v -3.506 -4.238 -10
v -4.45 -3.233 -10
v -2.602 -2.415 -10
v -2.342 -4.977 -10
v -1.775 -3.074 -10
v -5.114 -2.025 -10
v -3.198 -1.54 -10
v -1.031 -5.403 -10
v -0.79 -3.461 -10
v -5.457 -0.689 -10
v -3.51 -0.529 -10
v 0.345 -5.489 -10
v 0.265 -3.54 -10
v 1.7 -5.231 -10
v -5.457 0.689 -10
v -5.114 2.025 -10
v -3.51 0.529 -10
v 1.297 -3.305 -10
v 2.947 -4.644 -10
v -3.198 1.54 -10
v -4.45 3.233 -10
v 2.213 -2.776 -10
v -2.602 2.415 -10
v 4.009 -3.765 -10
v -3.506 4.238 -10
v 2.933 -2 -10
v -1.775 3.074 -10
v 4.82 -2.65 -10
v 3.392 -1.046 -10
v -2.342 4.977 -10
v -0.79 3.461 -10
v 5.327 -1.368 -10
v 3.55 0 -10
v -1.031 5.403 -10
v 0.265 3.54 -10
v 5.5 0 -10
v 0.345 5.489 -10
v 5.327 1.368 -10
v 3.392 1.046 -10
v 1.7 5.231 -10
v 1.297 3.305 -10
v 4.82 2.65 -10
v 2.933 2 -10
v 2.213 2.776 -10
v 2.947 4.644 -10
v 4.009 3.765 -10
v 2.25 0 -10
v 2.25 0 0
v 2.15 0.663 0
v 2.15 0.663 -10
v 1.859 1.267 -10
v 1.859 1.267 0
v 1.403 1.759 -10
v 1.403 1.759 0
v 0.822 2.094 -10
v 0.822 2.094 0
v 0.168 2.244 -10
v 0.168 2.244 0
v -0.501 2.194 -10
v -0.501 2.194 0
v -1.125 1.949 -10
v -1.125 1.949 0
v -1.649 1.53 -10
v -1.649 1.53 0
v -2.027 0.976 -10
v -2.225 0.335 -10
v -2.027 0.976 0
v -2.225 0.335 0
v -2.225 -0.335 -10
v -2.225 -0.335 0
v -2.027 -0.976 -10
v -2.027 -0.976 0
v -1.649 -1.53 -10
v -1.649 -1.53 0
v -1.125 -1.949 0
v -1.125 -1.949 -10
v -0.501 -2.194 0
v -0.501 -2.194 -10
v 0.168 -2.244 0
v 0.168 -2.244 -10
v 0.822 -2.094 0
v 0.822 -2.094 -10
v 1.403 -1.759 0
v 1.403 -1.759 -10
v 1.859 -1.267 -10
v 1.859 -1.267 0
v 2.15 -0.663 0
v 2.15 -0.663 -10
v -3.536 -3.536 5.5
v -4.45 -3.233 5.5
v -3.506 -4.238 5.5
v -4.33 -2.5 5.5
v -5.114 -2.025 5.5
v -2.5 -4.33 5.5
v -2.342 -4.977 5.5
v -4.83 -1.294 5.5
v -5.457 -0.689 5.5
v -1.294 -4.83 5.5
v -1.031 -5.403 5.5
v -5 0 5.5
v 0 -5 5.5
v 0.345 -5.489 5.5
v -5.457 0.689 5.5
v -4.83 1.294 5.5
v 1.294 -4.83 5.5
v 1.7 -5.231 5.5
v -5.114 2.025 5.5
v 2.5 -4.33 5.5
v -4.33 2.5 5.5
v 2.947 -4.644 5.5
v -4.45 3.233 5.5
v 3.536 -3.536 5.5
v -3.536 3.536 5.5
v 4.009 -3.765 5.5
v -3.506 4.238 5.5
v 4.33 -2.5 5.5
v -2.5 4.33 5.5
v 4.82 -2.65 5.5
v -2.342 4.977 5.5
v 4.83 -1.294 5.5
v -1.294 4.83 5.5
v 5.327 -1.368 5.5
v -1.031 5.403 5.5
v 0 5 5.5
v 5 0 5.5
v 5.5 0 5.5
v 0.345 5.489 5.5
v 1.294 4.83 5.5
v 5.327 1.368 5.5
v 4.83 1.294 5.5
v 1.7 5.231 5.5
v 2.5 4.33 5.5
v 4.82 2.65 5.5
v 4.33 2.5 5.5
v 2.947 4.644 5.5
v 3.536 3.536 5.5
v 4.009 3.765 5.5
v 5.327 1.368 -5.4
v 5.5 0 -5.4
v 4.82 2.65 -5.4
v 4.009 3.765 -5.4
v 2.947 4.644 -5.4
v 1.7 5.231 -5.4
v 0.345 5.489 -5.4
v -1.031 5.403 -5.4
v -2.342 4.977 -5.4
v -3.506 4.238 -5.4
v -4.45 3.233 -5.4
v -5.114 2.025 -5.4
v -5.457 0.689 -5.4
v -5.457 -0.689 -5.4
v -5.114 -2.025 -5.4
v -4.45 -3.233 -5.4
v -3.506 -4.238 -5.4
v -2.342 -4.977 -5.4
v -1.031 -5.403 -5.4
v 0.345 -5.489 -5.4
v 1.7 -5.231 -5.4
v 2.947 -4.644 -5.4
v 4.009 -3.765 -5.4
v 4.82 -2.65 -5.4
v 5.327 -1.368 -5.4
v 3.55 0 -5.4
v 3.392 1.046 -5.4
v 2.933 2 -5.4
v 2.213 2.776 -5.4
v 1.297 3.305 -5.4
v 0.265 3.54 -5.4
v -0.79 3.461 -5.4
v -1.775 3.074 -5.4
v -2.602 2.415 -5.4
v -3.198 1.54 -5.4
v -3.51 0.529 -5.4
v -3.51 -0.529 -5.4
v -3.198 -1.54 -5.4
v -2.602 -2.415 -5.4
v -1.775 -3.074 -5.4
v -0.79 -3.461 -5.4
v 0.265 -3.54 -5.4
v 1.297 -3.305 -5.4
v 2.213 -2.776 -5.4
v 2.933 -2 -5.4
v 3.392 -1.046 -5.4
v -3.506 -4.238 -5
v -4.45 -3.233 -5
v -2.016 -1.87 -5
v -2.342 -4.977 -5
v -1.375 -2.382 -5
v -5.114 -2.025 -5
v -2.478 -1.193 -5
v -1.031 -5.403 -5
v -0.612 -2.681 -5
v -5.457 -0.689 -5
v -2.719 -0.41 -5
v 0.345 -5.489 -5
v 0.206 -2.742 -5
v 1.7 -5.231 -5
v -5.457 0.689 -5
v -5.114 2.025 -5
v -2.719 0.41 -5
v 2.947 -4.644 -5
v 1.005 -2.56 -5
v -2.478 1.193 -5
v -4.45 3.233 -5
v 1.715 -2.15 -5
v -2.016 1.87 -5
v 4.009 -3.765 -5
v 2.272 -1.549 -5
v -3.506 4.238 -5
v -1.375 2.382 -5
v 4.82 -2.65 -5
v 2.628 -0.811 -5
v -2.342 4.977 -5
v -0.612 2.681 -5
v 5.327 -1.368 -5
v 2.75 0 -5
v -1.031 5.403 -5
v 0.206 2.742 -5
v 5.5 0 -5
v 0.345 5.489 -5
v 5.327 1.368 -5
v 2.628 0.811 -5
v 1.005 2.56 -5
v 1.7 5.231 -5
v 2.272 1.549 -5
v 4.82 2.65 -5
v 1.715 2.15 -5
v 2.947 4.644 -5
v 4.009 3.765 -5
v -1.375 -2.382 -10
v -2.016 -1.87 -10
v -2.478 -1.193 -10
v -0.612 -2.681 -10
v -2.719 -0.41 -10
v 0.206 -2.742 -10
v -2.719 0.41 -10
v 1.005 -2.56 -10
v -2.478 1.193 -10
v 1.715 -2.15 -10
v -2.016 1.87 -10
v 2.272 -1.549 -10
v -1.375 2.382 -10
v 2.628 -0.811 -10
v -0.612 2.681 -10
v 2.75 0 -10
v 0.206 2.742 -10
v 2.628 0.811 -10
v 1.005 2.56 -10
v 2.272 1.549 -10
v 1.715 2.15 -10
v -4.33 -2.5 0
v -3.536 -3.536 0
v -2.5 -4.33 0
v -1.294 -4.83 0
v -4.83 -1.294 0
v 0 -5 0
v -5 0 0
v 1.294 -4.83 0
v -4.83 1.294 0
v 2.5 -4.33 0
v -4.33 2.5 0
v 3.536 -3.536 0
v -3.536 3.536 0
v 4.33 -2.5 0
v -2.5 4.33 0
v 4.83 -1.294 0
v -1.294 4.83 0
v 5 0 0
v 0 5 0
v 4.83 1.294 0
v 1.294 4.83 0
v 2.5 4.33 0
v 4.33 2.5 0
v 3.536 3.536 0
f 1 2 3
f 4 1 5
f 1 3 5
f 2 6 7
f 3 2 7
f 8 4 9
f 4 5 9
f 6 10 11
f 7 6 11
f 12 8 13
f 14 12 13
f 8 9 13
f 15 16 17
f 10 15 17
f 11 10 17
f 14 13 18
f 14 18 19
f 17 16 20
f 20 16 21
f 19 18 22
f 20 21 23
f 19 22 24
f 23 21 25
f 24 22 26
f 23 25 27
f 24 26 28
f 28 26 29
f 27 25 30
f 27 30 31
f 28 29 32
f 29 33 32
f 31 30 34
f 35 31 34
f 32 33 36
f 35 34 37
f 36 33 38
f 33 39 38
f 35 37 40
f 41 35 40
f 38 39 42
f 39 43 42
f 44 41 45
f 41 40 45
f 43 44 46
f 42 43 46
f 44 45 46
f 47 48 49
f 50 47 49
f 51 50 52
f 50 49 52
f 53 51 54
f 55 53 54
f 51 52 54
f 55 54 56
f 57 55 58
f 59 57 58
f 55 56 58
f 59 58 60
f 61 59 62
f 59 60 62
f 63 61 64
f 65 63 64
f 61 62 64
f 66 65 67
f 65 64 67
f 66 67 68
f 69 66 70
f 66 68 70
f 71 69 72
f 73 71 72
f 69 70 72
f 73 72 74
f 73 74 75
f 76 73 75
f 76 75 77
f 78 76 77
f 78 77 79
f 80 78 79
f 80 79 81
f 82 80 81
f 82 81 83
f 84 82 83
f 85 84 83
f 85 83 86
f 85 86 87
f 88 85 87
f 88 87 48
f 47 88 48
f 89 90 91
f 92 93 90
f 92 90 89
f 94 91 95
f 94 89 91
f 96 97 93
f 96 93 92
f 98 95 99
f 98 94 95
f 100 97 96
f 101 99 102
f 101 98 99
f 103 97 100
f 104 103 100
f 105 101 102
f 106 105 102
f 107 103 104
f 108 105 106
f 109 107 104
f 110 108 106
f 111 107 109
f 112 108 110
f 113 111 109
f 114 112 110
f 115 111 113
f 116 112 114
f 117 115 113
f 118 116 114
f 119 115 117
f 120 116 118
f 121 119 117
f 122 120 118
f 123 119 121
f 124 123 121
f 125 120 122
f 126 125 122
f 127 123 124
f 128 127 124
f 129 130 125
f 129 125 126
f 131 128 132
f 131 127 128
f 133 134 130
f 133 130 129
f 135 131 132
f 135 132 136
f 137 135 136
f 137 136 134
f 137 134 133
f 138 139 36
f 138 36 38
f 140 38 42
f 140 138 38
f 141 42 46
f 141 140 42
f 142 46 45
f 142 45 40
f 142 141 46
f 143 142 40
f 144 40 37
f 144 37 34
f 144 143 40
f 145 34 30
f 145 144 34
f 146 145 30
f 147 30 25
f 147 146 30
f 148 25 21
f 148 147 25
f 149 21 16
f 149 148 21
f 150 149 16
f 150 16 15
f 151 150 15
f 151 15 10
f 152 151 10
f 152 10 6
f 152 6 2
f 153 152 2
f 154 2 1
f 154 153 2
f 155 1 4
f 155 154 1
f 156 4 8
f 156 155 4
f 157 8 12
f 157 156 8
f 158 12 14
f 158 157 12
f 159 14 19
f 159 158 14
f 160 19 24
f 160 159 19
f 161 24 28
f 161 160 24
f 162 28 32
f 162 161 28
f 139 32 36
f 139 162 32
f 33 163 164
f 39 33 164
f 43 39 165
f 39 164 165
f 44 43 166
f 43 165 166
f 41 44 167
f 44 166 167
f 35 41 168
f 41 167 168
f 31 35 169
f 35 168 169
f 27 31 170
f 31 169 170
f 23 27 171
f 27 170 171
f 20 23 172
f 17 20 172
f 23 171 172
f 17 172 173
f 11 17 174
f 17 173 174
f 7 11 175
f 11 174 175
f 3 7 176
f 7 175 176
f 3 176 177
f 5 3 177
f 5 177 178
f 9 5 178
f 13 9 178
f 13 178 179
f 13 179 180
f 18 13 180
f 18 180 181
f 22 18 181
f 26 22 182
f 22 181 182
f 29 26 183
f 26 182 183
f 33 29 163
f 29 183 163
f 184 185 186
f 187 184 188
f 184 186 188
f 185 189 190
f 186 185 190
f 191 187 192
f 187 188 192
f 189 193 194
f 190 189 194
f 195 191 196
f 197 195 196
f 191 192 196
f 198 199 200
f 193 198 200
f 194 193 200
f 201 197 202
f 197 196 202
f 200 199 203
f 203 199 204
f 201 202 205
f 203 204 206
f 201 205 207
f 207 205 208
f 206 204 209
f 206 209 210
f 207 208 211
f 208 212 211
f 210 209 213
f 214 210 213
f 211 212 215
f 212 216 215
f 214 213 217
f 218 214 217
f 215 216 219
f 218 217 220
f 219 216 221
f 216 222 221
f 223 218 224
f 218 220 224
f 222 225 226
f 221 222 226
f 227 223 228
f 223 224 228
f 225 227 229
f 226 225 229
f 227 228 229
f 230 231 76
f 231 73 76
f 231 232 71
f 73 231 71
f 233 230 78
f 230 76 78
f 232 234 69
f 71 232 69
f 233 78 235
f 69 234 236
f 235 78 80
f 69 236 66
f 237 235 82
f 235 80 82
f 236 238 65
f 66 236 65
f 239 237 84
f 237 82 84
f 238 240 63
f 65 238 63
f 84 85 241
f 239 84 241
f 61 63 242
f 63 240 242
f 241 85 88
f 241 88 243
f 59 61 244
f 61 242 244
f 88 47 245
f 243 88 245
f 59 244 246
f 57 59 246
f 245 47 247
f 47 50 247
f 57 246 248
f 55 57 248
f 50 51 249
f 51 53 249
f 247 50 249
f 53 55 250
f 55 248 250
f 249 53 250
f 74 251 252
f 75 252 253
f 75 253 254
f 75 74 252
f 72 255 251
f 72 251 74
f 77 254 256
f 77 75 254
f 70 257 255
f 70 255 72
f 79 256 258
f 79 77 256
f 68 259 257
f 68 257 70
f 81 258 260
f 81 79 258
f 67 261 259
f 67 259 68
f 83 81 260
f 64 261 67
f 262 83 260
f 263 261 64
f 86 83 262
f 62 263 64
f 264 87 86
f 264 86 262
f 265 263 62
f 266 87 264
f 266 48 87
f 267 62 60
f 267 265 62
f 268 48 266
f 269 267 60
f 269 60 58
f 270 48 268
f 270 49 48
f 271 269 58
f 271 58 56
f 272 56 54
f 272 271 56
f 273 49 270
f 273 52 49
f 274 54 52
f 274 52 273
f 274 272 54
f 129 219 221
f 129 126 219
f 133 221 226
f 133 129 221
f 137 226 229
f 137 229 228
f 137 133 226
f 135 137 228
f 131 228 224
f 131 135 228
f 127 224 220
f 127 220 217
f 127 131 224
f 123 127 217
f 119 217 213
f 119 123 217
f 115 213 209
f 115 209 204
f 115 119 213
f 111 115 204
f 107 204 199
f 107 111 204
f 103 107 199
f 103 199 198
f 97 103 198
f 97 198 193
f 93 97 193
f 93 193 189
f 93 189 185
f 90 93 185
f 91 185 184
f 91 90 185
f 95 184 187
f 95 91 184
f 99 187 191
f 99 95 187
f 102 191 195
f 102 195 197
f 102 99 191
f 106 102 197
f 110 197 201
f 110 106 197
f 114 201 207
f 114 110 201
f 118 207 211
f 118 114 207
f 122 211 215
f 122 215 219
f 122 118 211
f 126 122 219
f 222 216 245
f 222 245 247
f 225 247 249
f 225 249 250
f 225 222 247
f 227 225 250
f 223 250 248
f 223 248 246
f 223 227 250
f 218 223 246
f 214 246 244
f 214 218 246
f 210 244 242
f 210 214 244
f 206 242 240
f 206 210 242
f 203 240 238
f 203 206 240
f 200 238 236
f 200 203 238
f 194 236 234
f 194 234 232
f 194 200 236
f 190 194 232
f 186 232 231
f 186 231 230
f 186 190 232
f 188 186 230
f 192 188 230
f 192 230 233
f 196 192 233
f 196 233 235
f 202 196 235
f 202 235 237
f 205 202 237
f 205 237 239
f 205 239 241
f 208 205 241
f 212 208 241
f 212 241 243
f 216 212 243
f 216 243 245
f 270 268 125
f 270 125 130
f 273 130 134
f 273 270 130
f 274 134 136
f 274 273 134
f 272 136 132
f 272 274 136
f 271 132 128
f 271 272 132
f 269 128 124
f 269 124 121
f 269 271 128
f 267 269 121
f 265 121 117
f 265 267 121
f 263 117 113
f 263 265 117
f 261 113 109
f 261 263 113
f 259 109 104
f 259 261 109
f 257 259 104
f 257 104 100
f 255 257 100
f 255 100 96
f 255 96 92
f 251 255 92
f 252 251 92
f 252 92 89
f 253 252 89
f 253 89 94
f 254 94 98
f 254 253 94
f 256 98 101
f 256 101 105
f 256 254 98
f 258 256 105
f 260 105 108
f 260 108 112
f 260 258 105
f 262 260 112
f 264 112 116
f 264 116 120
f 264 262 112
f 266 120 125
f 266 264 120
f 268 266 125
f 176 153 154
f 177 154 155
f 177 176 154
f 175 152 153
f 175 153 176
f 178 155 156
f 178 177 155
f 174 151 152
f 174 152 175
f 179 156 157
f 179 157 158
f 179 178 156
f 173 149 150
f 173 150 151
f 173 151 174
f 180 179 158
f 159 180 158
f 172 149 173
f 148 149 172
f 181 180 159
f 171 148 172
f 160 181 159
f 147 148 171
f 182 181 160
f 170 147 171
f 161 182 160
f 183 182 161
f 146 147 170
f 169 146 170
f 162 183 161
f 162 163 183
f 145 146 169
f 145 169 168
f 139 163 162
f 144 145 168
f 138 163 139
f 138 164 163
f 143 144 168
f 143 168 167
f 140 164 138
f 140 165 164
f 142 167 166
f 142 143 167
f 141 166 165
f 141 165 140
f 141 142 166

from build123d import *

# Parameters (mm, degrees)
F0_R     = 5.5
F0_R_2   = 5
F1_DEPTH = 5.5
F0_R_3   = 3.55
F0_R_4   = 2.75
F0_R_5   = 2.25
F2_DEPTH = 5
F3_DEPTH = 10
F4_DEPTH = 5
F5_START = -5.4
F5_DEPTH = 4.6


with BuildPart() as f1:
    # F0 (on Top) → F1 (new body)
    with BuildSketch(Plane.XY):
        Circle(F0_R)
        Circle(F0_R_2, mode=Mode.SUBTRACT)
    extrude(amount=F1_DEPTH)



with BuildPart() as f2:
    # F0 (on Top) → F2 (new body)
    with BuildSketch(Plane.XY):
        Circle(F0_R_2)
        Circle(F0_R_3, mode=Mode.SUBTRACT)
        Circle(F0_R_3)
        Circle(F0_R_4, mode=Mode.SUBTRACT)
        Circle(F0_R_4)
        Circle(F0_R_5, mode=Mode.SUBTRACT)
    extrude(amount=-F2_DEPTH)

    # F0 (on Top) → F3 (join)
    with BuildSketch(Plane.XY):
        Circle(F0_R_4)
        Circle(F0_R_5, mode=Mode.SUBTRACT)
    extrude(amount=-F3_DEPTH)


with BuildPart() as f1_1:
    add(f1.part)

    add(f2.part)  # F4 merges F2
    # F0 (on Top) → F4 (join)
    with BuildSketch(Plane.XY):
        Circle(F0_R)
        Circle(F0_R_2, mode=Mode.SUBTRACT)
    extrude(amount=-F4_DEPTH)


with BuildPart() as f5:
    # F0 (on Top) → F5 (new body)
    with BuildSketch(Plane.XY.offset(F5_START)):
        Circle(F0_R)
        Circle(F0_R_2, mode=Mode.SUBTRACT)
        Circle(F0_R_2)
        Circle(F0_R_3, mode=Mode.SUBTRACT)
    extrude(amount=-F5_DEPTH)


solid = Compound([f1_1.part, f5.part])
